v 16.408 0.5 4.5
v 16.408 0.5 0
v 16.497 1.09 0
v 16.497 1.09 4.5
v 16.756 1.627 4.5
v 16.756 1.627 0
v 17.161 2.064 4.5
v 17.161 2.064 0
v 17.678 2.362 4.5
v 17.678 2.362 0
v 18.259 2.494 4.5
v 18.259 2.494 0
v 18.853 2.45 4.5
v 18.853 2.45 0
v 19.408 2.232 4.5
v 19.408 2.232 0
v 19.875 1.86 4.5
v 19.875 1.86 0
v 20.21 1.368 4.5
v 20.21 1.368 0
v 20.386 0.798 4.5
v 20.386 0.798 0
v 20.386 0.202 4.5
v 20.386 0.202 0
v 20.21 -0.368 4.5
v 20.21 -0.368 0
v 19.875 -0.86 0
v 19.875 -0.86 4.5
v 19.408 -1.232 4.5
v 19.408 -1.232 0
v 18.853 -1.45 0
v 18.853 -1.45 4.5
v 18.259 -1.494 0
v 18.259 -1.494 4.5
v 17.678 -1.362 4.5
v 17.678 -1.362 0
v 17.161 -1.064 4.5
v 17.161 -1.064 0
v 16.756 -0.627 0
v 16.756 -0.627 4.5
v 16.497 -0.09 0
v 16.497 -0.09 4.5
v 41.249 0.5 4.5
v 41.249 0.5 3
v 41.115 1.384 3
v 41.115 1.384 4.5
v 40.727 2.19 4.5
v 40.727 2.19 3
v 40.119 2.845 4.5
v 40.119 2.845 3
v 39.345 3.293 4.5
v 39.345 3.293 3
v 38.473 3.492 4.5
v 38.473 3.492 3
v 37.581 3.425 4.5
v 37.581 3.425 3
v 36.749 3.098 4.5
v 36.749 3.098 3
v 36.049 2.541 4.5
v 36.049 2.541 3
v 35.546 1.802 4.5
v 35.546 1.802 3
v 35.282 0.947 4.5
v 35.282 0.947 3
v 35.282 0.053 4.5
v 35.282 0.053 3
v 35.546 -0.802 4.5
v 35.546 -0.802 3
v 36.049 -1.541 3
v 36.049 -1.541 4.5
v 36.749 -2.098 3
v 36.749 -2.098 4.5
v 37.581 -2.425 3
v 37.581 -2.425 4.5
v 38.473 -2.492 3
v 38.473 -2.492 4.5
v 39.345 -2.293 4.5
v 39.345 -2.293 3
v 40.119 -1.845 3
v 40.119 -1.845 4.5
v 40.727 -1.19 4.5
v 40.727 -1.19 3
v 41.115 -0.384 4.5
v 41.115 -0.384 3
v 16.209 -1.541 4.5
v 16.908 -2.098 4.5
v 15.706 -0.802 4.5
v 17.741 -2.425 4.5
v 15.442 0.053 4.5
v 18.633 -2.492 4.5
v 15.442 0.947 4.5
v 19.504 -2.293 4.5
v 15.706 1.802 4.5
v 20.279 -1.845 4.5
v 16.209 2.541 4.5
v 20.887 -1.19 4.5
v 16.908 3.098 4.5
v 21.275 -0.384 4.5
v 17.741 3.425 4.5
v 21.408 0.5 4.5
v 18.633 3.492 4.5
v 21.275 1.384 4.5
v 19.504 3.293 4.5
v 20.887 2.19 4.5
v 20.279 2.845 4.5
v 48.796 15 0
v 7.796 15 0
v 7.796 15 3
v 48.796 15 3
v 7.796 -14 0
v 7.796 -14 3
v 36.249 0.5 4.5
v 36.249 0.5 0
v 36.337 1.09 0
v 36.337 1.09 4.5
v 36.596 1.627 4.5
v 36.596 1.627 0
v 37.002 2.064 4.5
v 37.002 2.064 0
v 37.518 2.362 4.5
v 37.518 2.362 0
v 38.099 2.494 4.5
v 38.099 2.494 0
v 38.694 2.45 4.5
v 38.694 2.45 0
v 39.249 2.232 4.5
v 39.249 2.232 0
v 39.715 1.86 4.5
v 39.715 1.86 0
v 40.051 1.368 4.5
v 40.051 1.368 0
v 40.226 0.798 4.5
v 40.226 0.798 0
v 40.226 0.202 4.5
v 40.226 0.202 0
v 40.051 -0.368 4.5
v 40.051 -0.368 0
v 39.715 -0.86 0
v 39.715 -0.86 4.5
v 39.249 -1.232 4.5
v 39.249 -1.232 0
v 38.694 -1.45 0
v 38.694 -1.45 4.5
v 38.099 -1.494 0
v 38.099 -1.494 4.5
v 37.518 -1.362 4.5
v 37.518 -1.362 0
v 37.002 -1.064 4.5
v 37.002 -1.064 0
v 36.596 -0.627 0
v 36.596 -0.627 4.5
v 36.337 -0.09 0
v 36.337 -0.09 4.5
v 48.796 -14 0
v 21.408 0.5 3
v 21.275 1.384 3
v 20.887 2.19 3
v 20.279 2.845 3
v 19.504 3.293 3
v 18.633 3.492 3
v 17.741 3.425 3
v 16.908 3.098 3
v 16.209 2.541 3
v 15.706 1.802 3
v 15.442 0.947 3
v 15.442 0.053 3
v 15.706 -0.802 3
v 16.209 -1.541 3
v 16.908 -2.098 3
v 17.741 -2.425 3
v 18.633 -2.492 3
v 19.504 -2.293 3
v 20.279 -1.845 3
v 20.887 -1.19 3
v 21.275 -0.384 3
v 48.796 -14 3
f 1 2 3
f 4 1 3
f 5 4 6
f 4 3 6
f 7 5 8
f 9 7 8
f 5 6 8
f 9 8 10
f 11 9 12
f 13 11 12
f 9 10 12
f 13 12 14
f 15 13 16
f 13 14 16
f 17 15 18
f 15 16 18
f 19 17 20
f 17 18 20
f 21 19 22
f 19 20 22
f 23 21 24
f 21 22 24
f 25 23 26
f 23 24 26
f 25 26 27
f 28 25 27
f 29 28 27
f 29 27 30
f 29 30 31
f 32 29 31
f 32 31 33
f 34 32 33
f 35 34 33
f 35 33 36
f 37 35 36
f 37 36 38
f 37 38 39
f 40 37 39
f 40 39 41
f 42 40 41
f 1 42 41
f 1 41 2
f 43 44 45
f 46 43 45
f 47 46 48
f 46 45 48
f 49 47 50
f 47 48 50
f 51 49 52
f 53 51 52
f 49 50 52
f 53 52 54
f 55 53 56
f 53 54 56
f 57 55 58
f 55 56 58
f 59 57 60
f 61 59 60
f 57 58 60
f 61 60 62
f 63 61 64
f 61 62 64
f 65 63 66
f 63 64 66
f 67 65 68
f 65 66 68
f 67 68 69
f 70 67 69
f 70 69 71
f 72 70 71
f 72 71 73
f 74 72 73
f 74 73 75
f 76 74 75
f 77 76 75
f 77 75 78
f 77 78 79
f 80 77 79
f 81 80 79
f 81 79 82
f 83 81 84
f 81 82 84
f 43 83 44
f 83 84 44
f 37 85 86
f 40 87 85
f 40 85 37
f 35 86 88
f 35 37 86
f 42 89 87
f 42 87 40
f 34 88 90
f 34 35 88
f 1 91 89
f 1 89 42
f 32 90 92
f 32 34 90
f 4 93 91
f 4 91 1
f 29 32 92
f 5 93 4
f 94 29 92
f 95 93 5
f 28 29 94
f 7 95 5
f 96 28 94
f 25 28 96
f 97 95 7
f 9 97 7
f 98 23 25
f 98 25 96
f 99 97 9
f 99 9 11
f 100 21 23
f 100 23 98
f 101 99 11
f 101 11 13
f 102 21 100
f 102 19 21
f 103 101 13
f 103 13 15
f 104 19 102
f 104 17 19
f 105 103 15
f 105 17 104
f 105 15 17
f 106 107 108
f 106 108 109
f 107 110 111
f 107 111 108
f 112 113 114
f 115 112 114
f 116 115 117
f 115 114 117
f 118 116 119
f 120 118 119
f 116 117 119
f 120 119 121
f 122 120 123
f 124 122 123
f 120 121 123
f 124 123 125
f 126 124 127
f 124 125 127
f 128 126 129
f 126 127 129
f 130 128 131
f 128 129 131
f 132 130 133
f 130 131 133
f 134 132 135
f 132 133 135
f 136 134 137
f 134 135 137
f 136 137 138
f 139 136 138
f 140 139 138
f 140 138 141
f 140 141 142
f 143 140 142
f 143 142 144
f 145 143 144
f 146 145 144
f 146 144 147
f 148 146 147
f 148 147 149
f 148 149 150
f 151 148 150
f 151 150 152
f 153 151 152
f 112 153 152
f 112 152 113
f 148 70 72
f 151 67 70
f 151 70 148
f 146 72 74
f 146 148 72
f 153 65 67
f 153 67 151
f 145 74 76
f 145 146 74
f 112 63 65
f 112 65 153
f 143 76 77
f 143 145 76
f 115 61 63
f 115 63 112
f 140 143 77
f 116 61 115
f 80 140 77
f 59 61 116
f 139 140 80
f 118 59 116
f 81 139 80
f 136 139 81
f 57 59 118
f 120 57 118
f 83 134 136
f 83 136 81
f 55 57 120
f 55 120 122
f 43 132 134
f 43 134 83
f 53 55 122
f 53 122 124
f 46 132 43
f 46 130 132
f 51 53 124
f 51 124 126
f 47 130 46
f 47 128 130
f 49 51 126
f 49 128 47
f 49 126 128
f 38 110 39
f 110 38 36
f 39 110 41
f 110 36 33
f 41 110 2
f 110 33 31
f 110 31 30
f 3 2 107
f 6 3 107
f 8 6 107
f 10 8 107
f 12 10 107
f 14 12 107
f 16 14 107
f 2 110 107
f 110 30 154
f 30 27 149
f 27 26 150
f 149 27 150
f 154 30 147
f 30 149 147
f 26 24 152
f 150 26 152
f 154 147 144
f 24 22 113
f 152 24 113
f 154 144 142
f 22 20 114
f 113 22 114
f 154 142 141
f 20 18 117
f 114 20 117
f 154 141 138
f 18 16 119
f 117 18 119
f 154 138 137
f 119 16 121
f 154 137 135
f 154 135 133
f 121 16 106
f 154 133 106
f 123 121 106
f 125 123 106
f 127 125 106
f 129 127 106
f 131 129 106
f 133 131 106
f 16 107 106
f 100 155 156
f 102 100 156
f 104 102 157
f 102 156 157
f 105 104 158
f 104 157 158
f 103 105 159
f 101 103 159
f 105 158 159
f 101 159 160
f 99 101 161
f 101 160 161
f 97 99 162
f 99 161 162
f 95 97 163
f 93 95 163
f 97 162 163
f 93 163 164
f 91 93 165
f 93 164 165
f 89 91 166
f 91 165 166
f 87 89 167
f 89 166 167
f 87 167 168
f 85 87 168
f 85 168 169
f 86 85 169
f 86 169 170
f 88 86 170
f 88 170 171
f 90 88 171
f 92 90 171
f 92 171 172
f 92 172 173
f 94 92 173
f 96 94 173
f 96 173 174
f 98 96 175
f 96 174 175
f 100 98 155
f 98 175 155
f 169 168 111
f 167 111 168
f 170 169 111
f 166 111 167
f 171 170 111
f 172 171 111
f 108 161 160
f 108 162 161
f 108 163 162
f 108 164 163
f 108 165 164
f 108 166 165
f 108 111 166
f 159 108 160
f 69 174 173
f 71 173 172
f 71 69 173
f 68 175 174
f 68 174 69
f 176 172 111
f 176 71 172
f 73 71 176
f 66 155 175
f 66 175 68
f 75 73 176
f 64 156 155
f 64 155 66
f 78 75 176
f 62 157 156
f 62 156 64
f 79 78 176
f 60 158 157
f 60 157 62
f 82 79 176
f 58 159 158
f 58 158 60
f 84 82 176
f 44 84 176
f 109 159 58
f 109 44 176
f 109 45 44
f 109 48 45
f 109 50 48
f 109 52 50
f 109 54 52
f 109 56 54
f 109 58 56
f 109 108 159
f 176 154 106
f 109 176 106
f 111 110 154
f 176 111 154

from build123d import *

# Parameters (mm, degrees)
SKETCH1_W                = 41
SKETCH1_H                = 29
BOSS_EXTRUDE1_DEPTH      = 3
SKETCH11_R               = 3
BOSS_EXTRUDE2_DEPTH      = 1.5
F_4_0_4_DIAMETER_HOLE1_D = 4


with BuildPart() as part:
    # Sketch1 → Boss-Extrude1 (new body)
    with BuildSketch(Plane.XY):
        Rectangle(SKETCH1_W, SKETCH1_H)
    extrude(amount=BOSS_EXTRUDE1_DEPTH)


with BuildPart() as part_1:
    # Body-Move/Copy1: moved
    add(part.part.moved(Location((0.5, 0.5, 0))))

    # Sketch11 → Boss-Extrude2 (add)
    with BuildSketch(Plane.XY.offset(3)):
        with Locations((-9.387244392, 0.5)):
            Circle(SKETCH11_R)
        with Locations((10.452938647, 0.5)):
            Circle(SKETCH11_R)
    extrude(amount=BOSS_EXTRUDE2_DEPTH)

    # Ø4.0 (4) Diameter Hole1 (through all)
    with Locations(Plane.XY.offset(4.5)):
        with Locations((-9.387244392, 0.5), (10.452938647, 0.5)):
            Hole(F_4_0_4_DIAMETER_HOLE1_D / 2)


with BuildPart() as part_2:
    # Body-Move/Copy8: moved
    add(part_1.part.moved(Location((27.795693281, 0, 0))))


solid = part_2.part
